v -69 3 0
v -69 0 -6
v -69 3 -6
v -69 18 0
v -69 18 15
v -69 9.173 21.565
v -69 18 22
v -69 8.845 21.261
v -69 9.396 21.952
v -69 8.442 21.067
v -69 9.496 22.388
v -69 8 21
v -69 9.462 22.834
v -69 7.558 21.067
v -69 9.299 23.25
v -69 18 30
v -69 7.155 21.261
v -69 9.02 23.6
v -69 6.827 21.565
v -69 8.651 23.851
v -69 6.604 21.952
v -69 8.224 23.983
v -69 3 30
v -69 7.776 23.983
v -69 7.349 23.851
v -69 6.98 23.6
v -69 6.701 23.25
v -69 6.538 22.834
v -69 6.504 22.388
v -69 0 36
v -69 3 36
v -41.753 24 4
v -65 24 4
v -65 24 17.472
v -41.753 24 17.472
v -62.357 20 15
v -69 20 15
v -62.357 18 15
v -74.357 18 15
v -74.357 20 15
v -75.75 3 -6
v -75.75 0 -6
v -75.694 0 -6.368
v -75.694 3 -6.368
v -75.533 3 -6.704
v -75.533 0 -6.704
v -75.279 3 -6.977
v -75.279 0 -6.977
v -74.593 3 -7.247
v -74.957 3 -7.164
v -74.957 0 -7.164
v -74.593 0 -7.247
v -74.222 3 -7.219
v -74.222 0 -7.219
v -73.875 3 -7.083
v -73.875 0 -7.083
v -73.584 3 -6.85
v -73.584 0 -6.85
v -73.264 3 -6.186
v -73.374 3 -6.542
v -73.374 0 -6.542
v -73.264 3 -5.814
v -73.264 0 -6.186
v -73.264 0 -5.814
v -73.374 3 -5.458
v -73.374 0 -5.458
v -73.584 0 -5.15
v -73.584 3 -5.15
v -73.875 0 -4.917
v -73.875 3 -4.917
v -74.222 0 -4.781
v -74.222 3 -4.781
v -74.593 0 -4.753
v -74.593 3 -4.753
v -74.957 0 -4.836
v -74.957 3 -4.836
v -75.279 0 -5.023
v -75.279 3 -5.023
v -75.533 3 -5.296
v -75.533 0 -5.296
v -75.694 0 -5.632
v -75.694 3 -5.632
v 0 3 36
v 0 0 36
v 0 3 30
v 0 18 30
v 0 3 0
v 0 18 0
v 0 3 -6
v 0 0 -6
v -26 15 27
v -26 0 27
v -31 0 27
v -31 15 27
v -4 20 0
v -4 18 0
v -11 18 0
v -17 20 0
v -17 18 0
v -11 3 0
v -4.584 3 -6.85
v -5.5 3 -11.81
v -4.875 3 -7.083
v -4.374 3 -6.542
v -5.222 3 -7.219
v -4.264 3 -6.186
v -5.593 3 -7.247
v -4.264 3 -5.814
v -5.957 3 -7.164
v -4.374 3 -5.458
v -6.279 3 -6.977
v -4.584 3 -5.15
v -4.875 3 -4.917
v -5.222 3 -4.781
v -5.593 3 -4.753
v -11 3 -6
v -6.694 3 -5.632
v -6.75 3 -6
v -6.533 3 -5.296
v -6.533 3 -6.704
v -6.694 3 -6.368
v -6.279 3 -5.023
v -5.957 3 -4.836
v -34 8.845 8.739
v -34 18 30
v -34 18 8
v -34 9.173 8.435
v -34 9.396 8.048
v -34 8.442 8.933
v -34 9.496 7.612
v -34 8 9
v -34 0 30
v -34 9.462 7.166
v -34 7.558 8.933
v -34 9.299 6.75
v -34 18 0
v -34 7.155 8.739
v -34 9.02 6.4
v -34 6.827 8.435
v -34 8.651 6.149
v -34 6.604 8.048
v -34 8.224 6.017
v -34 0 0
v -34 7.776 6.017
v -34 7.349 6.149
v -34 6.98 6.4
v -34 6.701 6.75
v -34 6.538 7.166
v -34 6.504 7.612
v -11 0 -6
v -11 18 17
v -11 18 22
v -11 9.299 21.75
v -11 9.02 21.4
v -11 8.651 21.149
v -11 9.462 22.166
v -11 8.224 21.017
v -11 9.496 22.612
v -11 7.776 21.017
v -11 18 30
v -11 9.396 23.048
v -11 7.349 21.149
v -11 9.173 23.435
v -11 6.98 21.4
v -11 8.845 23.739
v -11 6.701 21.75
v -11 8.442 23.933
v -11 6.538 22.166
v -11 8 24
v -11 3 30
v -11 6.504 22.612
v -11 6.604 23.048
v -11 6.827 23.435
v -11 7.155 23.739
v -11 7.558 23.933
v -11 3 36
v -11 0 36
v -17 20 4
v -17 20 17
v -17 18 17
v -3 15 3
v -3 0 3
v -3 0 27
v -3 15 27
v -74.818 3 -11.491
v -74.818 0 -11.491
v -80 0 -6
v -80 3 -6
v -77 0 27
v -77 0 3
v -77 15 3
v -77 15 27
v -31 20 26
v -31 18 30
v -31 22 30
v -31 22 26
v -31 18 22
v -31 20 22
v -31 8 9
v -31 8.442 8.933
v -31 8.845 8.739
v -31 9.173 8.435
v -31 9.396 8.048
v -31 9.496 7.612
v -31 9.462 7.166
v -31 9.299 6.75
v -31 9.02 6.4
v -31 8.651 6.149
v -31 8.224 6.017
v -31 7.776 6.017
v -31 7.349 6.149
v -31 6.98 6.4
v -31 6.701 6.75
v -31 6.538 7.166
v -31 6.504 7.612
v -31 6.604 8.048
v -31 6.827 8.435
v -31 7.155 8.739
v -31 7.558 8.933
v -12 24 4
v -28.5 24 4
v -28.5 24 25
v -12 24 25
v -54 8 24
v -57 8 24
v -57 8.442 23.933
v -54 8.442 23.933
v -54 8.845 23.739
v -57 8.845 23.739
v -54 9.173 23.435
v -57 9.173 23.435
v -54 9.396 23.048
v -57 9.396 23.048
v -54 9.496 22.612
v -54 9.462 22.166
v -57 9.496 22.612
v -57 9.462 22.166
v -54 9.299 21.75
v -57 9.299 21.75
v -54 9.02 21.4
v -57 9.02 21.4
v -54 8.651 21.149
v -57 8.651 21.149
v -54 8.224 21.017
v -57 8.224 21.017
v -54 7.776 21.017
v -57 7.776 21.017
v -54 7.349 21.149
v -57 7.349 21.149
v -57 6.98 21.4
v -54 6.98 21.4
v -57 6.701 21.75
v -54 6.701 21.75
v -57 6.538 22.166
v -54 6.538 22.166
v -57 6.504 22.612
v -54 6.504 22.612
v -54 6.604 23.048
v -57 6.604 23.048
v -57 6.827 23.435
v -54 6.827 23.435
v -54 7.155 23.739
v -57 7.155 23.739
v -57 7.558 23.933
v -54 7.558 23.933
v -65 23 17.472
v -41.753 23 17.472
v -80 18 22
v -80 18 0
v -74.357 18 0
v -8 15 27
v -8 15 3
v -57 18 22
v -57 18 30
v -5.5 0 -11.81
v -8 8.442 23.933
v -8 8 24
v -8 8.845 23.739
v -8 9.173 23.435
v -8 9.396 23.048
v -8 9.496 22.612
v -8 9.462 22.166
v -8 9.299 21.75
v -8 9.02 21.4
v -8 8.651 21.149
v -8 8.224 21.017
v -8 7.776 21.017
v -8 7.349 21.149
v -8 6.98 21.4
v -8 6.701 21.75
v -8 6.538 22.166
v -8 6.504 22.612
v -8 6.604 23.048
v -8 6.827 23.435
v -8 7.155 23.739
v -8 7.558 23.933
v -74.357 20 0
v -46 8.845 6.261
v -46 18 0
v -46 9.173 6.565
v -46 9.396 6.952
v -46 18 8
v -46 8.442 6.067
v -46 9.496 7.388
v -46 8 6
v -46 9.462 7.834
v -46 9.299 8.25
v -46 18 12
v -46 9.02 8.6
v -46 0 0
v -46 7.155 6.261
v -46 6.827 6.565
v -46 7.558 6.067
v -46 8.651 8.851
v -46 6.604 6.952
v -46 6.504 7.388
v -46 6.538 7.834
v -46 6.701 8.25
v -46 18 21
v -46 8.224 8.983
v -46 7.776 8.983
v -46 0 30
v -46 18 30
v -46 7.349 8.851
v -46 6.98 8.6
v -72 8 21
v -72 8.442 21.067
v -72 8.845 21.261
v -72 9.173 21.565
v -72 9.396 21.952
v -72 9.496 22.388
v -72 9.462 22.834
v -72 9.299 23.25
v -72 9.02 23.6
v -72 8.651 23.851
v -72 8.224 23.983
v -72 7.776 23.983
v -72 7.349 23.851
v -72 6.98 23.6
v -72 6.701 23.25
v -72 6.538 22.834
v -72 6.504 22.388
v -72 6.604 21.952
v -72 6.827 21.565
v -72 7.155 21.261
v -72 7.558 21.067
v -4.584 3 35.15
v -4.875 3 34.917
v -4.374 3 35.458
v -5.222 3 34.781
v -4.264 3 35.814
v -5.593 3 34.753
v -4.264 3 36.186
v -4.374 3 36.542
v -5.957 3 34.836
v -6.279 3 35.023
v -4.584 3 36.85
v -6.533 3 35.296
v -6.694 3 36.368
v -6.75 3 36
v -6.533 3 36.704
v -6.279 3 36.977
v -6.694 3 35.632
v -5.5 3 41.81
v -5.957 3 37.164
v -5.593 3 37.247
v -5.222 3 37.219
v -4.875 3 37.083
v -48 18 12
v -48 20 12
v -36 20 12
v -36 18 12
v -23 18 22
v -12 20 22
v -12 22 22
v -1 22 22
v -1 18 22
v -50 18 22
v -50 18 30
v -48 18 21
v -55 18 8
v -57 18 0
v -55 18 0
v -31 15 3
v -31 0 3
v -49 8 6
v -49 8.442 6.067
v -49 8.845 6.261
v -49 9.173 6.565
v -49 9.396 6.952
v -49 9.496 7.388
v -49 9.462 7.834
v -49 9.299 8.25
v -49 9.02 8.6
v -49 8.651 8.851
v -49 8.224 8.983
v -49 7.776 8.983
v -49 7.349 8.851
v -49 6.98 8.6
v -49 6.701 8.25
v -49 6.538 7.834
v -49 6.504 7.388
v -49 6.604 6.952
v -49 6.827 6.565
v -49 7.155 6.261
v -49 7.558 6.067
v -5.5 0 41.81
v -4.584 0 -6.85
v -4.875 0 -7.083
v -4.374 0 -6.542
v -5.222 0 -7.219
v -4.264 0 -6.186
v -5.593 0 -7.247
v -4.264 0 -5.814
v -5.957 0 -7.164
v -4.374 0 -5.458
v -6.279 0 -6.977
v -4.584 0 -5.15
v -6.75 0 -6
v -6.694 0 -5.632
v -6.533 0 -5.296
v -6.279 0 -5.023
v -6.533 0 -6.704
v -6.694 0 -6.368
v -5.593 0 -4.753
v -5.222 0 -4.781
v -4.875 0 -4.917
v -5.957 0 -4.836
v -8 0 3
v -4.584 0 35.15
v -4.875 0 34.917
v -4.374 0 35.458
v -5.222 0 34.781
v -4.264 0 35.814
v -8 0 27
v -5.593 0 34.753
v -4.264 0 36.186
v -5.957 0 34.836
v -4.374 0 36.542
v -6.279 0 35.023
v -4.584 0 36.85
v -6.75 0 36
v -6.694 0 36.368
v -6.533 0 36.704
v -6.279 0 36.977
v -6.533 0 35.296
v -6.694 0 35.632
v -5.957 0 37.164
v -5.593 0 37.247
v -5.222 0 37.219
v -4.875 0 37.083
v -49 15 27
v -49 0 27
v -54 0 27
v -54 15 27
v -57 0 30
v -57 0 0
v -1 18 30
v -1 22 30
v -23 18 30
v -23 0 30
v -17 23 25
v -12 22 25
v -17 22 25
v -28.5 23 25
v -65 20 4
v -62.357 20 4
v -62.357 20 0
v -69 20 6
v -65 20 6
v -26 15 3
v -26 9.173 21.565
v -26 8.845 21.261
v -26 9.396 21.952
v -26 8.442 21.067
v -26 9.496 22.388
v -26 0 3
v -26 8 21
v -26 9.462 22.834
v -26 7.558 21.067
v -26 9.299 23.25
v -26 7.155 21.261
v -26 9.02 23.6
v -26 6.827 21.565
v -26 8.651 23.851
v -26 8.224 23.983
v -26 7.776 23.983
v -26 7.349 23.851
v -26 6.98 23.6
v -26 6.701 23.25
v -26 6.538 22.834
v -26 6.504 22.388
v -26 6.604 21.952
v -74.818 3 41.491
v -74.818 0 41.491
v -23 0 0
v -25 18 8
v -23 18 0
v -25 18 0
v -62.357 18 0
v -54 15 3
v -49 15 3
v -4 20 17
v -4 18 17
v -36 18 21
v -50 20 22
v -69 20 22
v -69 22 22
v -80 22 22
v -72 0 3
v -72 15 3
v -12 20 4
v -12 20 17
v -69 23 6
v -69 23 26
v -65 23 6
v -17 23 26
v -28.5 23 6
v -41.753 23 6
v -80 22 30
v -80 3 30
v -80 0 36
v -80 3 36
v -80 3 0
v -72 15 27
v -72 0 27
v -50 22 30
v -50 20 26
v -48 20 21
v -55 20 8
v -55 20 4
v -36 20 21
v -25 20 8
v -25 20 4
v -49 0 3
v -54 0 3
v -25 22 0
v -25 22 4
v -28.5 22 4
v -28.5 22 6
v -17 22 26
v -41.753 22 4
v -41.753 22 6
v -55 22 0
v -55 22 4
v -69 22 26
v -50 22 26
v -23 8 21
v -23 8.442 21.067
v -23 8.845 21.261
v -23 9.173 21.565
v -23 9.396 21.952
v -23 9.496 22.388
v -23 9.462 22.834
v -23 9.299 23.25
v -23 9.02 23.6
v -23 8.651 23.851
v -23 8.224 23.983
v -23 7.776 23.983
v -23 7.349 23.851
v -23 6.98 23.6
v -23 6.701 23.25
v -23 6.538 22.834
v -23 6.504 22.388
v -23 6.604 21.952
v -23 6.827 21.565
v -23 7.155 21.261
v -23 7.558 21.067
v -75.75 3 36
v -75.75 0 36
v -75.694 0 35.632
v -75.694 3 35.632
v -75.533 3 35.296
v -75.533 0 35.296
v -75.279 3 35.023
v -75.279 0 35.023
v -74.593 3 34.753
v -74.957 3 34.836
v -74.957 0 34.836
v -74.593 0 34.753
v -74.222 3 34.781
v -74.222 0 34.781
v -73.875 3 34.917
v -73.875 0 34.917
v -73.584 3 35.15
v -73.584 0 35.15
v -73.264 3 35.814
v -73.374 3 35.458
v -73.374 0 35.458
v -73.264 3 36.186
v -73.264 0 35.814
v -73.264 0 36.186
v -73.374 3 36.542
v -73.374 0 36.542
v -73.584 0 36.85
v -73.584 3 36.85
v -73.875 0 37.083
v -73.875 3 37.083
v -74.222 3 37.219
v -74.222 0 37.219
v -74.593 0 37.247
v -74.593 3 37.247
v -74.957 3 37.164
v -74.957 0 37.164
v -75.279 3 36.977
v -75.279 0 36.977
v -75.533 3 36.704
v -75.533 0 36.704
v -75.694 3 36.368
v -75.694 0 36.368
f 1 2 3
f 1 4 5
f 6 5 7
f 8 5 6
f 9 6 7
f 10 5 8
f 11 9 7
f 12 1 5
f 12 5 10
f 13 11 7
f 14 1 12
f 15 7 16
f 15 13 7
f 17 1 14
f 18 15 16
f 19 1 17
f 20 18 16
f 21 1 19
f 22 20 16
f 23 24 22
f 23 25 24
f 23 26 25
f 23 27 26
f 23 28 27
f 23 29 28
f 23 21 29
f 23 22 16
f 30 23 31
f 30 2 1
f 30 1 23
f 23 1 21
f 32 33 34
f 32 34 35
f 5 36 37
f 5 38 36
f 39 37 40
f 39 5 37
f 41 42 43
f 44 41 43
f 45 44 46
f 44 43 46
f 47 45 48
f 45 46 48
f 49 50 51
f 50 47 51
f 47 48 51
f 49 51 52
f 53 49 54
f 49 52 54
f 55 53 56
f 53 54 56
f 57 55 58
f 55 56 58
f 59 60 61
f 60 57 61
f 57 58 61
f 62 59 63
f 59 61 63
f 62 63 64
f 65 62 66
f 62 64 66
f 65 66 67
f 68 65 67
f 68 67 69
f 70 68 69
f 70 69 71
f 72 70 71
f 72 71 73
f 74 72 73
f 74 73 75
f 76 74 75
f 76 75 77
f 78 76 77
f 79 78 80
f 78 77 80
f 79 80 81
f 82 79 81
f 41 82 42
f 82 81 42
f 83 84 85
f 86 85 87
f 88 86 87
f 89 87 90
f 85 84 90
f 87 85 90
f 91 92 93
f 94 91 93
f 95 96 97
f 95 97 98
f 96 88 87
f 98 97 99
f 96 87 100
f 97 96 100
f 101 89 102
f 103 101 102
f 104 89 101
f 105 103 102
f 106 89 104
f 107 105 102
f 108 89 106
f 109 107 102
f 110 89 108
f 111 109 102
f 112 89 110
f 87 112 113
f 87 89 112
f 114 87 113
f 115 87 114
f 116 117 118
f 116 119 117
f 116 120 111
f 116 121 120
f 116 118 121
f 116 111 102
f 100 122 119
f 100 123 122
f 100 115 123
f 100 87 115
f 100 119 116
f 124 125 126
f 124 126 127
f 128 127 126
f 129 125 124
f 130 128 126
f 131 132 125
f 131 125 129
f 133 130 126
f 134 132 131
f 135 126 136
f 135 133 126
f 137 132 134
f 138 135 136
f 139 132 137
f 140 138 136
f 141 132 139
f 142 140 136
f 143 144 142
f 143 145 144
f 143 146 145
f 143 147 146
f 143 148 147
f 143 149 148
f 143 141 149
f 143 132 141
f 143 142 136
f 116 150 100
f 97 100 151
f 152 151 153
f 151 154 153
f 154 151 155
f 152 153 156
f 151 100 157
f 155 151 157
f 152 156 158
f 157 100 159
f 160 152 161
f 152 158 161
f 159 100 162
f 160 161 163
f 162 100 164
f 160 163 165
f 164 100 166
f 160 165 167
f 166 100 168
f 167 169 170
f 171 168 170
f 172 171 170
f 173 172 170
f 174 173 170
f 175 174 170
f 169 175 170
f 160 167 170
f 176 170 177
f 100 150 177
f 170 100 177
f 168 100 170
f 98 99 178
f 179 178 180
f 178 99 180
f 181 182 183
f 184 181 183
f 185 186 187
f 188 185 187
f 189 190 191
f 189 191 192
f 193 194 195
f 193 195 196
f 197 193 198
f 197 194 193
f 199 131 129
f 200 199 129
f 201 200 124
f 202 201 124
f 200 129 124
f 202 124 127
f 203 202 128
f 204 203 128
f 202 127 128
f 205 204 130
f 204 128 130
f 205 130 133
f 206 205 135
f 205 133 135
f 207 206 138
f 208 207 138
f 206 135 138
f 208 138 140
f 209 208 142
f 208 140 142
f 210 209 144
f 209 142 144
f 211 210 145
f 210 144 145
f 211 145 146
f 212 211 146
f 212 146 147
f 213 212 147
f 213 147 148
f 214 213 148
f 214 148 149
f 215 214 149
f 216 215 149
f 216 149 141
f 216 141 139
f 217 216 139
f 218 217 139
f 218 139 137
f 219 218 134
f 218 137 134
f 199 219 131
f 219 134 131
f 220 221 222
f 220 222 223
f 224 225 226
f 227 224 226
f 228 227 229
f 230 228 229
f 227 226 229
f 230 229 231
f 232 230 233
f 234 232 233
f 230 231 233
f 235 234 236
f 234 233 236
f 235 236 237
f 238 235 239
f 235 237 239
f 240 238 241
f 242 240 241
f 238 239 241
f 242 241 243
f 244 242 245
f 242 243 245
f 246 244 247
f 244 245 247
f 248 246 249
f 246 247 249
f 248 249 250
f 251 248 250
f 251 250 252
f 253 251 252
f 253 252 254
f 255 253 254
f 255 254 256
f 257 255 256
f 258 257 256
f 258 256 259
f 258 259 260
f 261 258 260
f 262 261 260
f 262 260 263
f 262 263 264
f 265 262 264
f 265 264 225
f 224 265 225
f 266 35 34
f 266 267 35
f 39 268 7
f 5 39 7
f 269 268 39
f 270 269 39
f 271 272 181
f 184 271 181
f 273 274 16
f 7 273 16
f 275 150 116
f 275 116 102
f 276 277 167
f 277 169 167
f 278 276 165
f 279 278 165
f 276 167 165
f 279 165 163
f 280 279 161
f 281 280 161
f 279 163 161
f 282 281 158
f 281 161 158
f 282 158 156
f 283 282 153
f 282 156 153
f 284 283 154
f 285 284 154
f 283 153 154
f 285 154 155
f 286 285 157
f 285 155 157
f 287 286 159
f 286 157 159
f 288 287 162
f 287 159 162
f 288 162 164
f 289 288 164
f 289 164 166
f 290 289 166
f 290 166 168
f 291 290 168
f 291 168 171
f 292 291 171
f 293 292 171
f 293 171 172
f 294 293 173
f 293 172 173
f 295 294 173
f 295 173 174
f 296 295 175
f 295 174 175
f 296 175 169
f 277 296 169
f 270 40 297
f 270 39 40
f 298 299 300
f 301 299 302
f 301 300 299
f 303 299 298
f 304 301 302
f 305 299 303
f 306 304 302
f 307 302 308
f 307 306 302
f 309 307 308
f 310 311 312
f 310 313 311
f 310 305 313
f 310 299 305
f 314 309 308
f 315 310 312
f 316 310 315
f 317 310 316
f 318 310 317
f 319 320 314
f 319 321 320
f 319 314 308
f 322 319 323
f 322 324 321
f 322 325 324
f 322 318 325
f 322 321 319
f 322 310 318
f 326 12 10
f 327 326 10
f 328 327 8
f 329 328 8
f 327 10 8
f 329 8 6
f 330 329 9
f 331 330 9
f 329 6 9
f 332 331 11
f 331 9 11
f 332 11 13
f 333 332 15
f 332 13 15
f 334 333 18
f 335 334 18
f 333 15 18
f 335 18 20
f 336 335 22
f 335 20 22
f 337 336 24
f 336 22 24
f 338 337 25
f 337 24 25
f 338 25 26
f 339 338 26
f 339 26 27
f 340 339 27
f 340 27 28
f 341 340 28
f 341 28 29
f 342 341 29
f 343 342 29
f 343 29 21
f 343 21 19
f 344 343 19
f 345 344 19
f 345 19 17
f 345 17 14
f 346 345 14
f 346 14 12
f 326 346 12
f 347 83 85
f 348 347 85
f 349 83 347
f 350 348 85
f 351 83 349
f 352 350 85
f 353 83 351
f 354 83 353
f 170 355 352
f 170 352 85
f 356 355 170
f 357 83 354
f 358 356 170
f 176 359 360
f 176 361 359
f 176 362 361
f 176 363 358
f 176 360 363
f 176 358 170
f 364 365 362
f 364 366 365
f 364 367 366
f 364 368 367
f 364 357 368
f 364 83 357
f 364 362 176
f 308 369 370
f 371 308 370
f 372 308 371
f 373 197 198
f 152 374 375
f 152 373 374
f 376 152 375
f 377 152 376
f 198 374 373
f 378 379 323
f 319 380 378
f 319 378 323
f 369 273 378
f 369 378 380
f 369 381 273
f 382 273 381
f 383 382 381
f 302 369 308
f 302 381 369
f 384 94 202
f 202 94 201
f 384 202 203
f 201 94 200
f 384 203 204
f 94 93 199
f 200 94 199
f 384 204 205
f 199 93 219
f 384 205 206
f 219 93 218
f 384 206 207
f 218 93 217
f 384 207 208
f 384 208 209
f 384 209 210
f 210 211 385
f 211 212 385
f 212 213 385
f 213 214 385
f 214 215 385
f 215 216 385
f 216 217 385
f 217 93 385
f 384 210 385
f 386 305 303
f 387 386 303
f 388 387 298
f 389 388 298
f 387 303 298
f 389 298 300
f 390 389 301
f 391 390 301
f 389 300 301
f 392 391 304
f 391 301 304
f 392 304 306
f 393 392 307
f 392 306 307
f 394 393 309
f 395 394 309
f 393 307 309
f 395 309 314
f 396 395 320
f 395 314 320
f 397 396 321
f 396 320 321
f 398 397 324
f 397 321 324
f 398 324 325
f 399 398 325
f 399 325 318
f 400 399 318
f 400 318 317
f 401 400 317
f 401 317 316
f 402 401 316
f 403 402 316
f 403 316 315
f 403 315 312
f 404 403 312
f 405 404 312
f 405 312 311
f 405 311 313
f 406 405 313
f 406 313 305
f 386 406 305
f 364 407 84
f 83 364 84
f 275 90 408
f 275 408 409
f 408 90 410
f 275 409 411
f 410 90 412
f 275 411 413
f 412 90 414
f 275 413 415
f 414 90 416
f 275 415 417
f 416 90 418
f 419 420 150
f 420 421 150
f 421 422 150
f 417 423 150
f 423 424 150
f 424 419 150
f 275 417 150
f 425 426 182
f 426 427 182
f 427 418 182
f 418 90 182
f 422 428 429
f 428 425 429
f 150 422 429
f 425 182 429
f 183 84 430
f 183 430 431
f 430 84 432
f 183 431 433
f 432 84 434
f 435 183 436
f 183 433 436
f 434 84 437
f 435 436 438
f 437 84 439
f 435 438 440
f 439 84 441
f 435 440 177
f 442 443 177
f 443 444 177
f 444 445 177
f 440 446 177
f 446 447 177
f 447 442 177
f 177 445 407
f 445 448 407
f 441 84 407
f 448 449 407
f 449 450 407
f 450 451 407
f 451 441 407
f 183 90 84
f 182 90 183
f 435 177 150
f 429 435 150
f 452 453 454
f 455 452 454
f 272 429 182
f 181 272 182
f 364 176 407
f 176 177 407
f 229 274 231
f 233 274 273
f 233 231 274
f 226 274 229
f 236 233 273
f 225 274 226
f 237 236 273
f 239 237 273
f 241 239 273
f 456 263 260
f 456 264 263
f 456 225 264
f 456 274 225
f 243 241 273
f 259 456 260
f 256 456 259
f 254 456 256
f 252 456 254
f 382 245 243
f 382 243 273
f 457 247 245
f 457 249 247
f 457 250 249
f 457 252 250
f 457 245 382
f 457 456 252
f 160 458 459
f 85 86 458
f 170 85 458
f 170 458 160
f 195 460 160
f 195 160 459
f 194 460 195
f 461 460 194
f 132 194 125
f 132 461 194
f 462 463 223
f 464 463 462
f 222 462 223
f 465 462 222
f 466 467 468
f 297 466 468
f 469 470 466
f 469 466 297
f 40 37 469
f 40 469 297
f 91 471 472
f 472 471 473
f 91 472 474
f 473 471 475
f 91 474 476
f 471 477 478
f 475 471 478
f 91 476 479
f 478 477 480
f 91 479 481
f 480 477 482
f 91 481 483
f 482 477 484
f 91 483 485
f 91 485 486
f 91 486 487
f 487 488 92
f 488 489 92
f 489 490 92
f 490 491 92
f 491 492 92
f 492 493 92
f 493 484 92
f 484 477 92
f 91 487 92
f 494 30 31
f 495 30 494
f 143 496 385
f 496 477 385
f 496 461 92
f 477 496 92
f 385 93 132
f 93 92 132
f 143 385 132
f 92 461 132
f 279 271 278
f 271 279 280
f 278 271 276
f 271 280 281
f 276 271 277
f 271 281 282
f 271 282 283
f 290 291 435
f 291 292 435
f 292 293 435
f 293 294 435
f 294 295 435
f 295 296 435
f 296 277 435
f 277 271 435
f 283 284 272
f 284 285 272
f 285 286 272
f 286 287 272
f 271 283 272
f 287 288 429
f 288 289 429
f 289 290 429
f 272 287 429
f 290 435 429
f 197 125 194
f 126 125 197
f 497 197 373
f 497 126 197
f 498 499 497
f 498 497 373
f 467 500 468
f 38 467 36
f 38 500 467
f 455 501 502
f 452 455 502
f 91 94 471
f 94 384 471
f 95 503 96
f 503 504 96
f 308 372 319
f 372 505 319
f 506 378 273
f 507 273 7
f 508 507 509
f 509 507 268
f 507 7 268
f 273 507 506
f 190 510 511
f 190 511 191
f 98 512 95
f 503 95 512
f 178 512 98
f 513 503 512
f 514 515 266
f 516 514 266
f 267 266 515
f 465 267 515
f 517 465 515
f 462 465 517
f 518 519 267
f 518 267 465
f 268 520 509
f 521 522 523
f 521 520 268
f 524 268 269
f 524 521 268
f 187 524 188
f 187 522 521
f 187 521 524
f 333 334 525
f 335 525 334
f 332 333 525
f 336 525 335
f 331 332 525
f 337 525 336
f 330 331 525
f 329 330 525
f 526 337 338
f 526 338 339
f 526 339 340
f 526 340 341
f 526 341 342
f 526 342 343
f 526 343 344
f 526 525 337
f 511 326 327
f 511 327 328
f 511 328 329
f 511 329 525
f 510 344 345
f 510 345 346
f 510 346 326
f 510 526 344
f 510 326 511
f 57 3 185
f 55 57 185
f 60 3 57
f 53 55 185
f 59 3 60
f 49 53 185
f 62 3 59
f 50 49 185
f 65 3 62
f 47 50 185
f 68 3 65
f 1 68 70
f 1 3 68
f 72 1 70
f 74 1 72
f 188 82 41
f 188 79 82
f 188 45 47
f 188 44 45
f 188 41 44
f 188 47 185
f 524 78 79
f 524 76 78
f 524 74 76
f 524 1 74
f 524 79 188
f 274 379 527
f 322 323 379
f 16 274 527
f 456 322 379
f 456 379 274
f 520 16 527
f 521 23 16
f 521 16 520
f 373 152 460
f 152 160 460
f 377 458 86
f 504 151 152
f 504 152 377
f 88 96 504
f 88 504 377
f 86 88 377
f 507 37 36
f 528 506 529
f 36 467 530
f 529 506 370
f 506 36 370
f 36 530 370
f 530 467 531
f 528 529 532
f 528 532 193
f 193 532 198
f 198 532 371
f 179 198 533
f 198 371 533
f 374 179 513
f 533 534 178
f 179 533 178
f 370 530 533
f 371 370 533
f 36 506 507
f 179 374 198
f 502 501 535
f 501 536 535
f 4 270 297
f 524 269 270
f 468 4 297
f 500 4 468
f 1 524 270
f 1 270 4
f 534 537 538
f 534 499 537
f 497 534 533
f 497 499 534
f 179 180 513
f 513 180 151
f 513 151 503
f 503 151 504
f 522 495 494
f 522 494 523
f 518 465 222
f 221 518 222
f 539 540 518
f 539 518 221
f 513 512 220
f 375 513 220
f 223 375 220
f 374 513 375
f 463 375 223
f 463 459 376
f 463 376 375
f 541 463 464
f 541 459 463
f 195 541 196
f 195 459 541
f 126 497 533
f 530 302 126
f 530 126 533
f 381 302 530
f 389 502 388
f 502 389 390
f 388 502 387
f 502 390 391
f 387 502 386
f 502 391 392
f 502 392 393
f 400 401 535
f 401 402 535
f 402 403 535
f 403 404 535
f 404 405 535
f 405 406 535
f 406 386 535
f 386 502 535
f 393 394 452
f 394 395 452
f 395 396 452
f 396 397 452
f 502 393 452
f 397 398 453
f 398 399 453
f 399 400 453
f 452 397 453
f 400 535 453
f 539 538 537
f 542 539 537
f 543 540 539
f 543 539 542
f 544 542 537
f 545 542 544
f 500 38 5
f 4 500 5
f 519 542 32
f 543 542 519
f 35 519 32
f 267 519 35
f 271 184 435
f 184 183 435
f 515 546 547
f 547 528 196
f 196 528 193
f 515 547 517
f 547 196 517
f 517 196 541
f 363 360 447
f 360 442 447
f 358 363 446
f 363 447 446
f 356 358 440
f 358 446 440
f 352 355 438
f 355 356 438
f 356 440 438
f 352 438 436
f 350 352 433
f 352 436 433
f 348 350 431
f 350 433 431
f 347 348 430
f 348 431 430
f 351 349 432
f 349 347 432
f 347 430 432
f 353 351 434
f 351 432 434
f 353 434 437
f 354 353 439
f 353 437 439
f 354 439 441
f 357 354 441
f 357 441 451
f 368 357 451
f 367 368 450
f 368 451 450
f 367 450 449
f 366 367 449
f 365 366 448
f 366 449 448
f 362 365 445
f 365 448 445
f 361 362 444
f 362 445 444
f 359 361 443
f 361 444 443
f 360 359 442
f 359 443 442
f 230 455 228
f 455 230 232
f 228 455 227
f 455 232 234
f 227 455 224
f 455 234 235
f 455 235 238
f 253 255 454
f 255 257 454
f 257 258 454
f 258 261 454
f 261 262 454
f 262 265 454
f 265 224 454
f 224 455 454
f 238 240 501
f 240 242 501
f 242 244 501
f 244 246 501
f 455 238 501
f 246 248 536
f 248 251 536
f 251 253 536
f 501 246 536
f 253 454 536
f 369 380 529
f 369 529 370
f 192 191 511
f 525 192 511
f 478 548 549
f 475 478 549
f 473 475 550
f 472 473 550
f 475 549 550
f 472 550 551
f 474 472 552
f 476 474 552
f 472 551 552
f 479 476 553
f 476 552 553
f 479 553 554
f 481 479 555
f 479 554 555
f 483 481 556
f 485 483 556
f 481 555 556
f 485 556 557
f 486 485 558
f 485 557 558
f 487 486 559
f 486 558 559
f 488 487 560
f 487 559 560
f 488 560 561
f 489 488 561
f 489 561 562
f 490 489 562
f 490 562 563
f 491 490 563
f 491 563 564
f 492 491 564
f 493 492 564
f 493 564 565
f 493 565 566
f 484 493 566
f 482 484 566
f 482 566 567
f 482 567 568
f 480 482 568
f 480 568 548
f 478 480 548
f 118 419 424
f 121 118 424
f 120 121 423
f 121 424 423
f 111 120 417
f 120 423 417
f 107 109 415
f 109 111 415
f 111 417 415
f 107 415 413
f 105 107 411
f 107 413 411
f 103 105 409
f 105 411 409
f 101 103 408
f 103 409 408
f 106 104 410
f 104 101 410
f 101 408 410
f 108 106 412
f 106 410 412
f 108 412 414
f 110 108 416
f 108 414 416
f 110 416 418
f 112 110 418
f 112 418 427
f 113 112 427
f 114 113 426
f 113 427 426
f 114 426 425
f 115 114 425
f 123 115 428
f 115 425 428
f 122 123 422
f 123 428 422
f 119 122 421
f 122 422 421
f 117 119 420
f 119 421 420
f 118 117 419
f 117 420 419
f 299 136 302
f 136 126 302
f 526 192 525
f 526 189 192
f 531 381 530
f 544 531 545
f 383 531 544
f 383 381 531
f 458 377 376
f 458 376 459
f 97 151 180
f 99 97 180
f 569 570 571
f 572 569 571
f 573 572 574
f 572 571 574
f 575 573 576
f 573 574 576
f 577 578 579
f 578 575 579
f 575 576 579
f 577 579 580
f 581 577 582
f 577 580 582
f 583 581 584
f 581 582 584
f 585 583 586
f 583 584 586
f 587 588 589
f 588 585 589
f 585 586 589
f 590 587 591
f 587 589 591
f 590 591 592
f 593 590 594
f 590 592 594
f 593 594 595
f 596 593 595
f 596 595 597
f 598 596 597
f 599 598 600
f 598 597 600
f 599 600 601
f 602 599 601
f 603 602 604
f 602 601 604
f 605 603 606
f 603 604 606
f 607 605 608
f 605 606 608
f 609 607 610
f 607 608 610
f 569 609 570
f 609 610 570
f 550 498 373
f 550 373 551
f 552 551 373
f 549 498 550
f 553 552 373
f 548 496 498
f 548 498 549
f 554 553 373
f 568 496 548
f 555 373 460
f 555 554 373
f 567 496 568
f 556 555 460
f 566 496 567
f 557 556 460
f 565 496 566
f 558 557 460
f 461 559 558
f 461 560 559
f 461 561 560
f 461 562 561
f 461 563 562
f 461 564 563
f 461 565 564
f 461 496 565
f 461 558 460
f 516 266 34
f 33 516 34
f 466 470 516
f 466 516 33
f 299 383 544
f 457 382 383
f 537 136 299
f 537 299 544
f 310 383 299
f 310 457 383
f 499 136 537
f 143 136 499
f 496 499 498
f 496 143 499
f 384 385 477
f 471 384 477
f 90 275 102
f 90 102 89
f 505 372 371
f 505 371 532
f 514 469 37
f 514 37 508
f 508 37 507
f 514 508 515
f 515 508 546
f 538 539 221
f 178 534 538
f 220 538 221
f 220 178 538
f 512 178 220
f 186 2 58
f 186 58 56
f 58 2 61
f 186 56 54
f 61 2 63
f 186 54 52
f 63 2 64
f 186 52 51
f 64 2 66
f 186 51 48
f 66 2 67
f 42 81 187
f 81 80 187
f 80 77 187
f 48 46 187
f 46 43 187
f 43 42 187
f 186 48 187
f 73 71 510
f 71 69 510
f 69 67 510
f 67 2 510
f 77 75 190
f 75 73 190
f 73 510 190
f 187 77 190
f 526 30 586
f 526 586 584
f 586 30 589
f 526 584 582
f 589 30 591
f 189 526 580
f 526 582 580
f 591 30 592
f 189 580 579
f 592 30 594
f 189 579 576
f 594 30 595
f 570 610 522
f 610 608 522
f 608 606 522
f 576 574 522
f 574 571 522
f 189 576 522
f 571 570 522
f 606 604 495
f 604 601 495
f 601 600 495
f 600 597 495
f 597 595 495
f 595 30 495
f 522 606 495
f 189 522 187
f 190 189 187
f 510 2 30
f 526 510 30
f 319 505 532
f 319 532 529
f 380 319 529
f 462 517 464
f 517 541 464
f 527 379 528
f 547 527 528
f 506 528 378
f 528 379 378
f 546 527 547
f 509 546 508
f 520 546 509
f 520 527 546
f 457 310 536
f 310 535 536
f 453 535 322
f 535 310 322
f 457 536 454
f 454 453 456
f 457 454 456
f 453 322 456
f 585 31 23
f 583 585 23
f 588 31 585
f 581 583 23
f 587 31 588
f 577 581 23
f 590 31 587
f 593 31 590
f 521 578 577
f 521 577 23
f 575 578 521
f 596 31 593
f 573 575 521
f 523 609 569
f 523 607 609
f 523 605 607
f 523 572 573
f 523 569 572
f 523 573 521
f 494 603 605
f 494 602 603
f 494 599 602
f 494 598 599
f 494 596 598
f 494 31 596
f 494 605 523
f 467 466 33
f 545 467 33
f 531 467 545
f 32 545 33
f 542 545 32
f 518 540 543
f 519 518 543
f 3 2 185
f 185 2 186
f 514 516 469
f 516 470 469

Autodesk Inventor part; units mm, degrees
ref_plane "YZ Plane" through (0, 0, 0) normal (1, 0, 0) x (0, 1, 0)
ref_plane "XY Plane" through (0, 0, 0) normal (0, 0, 1) x (1, 0, 0)
sketch "Sketch1" plane through (0, 0, 0) normal (0, 1, 0) x (-1, 0, 0)
  line L0 (0, 0) -> (80, 0) construction
  line L1 (80, 0) -> (80, 30) construction
  line L2 (80, 30) -> (0, 30) construction
  line L3 (0, 30) -> (0, 0) construction
  dimension "d0" = 80
  dimension "d1" = 30
sketch "Sketch2" plane through (0, 0, 0) normal (0, 1, 0) x (-1, 0, 0)
  line L0 (80, 0) -> (69, 0)
  line L1 (69, 0) -> (69, 30)
  line L2 (69, 30) -> (80, 30)
  line L3 (80, 30) -> (80, 0)
  line L4 (0, 0) -> (11, 0)
  line L5 (11, 0) -> (11, 30)
  line L6 (11, 30) -> (0, 30)
  line L7 (0, 30) -> (0, 0)
  line L8 (57, 0) -> (46, 0)
  line L9 (46, 0) -> (46, 30)
  line L10 (46, 30) -> (57, 30)
  line L11 (57, 30) -> (57, 0)
  line L12 (34, 0) -> (23, 0)
  line L13 (23, 0) -> (23, 30)
  line L14 (23, 30) -> (34, 30)
  line L15 (34, 30) -> (34, 0)
  line L16 (69, 15) -> (57, 15) construction
  line L17 (46, 15) -> (34, 15) construction
  line L18 (23, 15) -> (11, 15) construction
  line L19 (72, 3) -> (77, 3)
  line L20 (77, 3) -> (77, 27)
  line L21 (77, 27) -> (72, 27)
  line L22 (72, 27) -> (72, 3)
  line L23 (54, 3) -> (49, 3)
  line L24 (49, 3) -> (49, 27)
  line L25 (49, 27) -> (54, 27)
  line L26 (54, 27) -> (54, 3)
  line L27 (31, 3) -> (26, 3)
  line L28 (26, 3) -> (26, 27)
  line L29 (26, 27) -> (31, 27)
  line L30 (31, 27) -> (31, 3)
  line L31 (8, 27) -> (8, 3)
  line L32 (8, 3) -> (3, 3)
  line L33 (3, 3) -> (3, 27)
  line L34 (3, 27) -> (8, 27)
  dimension "d2" = 11
  dimension "d3" = 30
  dimension "d4" = 11
  dimension "d6" = 11
  dimension "d8" = 11
  dimension "d9" = 80
  dimension "d10" = 3
  dimension "d11" = 3
  dimension "d12" = 3
  dimension "d13" = 3
extrude "Extrusion1" add sketch "Sketch2" along normal blind 15
sketch "Sketch3" plane through (0, 15, 0) normal (0, 1, 0) x (1, 0, 0)
  line L0 (-69, 0) -> (-80, 0) projected
  line L1 (-80, 0) -> (-69, 0)
  line L2 (-69, 0) -> (-69, -30)
  line L3 (-69, -30) -> (-80, -30)
  line L4 (-80, -30) -> (-80, 0)
  line L5 (-57, 0) -> (-46, 0)
  line L6 (-46, 0) -> (-46, -30)
  line L7 (-46, -30) -> (-57, -30)
  line L8 (-57, -30) -> (-57, 0)
  line L9 (-34, 0) -> (-23, 0)
  line L10 (-23, 0) -> (-23, -30)
  line L11 (-23, -30) -> (-34, -30)
  line L12 (-34, -30) -> (-34, 0)
  line L13 (-11, 0) -> (0, 0)
  line L14 (0, 0) -> (0, -30)
  line L15 (0, -30) -> (-11, -30)
  line L16 (-11, -30) -> (-11, 0)
  dimension "d16" = 30
  dimension "d19" = 23
extrude "Extrusion2" add sketch "Sketch3" along normal blind 3
sketch "Sketch4" plane through (-69, 0, 30) normal (1, 0, 0) x (0, 0, -1)
  circle A0 centre (7.5, 8) radius 1.5
  line L0 (3, 0) -> (27, 0) projected
  line L1 (0, 0) -> (0, 18) construction
  dimension "d26" = 3
  dimension "d28" = 8
  dimension "d29" = 7.5
extrude "Extrusion3" cut sketch "Sketch4" against normal blind 3
sketch "Sketch5" plane through (-57, 0, 0) normal (-1, 0, 0) x (0, 0, 1)
  circle A0 centre (22.5, 8) radius 1.5
  line L0 (30, 0) -> (30, 18) projected
  line L1 (3, 0) -> (27, 0) projected
  point P0 (0, 0)
  dimension "d33" = 3
  dimension "d34" = 7.5
  dimension "d35" = 8
extrude "Extrusion4" cut sketch "Sketch5" against normal blind 3
sketch "Sketch6" plane through (-46, 0, 30) normal (1, 0, 0) x (0, 0, -1)
  circle A0 centre (22.5, 8) radius 1.5
  line L0 (30, 0) -> (30, 18) projected
  line L1 (3, 0) -> (27, 0) projected
  dimension "d38" = 3
  dimension "d39" = 7.5
  dimension "d40" = 8
sketch "Sketch7" plane through (-34, 0, 0) normal (-1, 0, 0) x (0, 0, 1)
  circle A0 centre (7.5, 8) radius 1.5
  line L0 (3, 0) -> (27, 0) projected
  line L1 (0, 0) -> (0, 18) projected
  dimension "d41" = 3
  dimension "d42" = 8
  dimension "d43" = 7.5
sketch "Sketch8" plane through (-23, 0, 30) normal (1, 0, 0) x (0, 0, -1)
  circle A0 centre (7.5, 8) radius 1.5
  line L0 (3, 0) -> (27, 0) projected
  line L1 (0, 0) -> (0, 18) projected
  point P0 (30, 0)
  dimension "d44" = 3
  dimension "d45" = 8
  dimension "d46" = 7.5
sketch "Sketch9" plane through (-11, 0, 0) normal (-1, 0, 0) x (0, 0, 1)
  point P0 (0, 0)
sketch "Sketch10" plane through (-11, 0, 0) normal (-1, 0, 0) x (0, 0, 1)
  circle A0 centre (22.5, 8) radius 1.5
  line L0 (30, 0) -> (30, 18) projected
  line L1 (3, 0) -> (27, 0) projected
  point P0 (0, 0)
  dimension "d47" = 3
  dimension "d48" = 7.5
  dimension "d49" = 8
extrude "Extrusion5" cut sketch "Sketch6" against normal blind 3
extrude "Extrusion6" cut sketch "Sketch7" against normal blind 3
extrude "Extrusion7" cut sketch "Sketch8" against normal blind 3
extrude "Extrusion8" cut sketch "Sketch10" against normal blind 3
ref_plane "Work Plane1" through (0, 18, 0) normal (0, 1, 0) x (-1, 0, 0)
sketch "Sketch12" plane through (0, 18, 0) normal (0, 1, 0) x (-1, 0, 0)
  line L0 (80, 30) -> (50, 30)
  line L1 (50, 30) -> (50, 22)
  line L2 (50, 22) -> (80, 22)
  line L3 (80, 22) -> (80, 30)
  line L4 (55, 0) -> (25, 0)
  line L5 (25, 0) -> (25, 8)
  line L6 (25, 8) -> (55, 8)
  line L7 (55, 8) -> (55, 0)
  line L8 (31, 3) -> (31, 27) projected
  line L9 (31, 22) -> (1, 22)
  line L10 (1, 22) -> (1, 30)
  line L11 (1, 30) -> (31, 30)
  line L12 (31, 30) -> (31, 22)
  point P0 (0, 0)
  dimension "d59" = 30
  dimension "d60" = 8
  dimension "d61" = 30
  dimension "d62" = 8
  dimension "d63" = 30
sketch "Sketch13" plane through (0, 18, 0) normal (0, 1, 0) x (-1, 0, 0)
  line L0 (74.3573, 0) -> (62.3573, 0)
  line L1 (62.3573, 0) -> (62.3573, 15)
  line L2 (62.3573, 15) -> (74.3573, 15)
  line L3 (74.3573, 15) -> (74.3573, 0)
  line L4 (48, 12) -> (36, 12)
  line L5 (36, 12) -> (36, 21)
  line L6 (36, 21) -> (48, 21)
  line L7 (48, 21) -> (48, 12)
  line L8 (0, 0) -> (11, 0) projected
  line L9 (4, 0) -> (17, 0)
  line L10 (17, 0) -> (17, 17)
  line L11 (17, 17) -> (4, 17)
  line L12 (4, 17) -> (4, 0)
  dimension "d64" = 12
  dimension "d65" = 15
  dimension "d66" = 12
  dimension "d67" = 13
  dimension "d68" = 17
extrude "Extrusion9" add sketch "Sketch13" along normal blind 2
extrude "Extrusion10" add sketch "Sketch12" along normal blind 4
sketch "Sketch14" plane through (0, 20, 0) normal (0, 1, 0) x (1, 0, 0)
  line L0 (-65, -4) -> (-41.7529, -4)
  line L1 (-41.7529, -4) -> (-41.7529, -17.4715)
  line L2 (-41.7529, -17.4715) -> (-65, -17.4715)
  line L3 (-65, -17.4715) -> (-65, -4)
  line L4 (-12, -25) -> (-28.5, -25)
  line L5 (-28.5, -25) -> (-28.5, -4)
  line L6 (-28.5, -4) -> (-12, -4)
  line L7 (-12, -4) -> (-12, -25)
  point P0 (0, 0)
  dimension "d73" = 16.5
extrude "Extrusion11" add sketch "Sketch14" along normal blind 4
sketch "Sketch15" plane through (0, 20, 0) normal (0, 1, 0) x (1, 0, 0)
  line L0 (-69, -30) -> (-69, -22) projected
  line L1 (-69, -26) -> (-17, -26)
  line L2 (-17, -26) -> (-17, -6)
  line L3 (-17, -6) -> (-69, -6)
  line L4 (-69, -6) -> (-69, -26)
  point P0 (0, 0)
  dimension "d76" = 52
  dimension "d77" = 20
extrude "Extrusion12" add sketch "Sketch15" along normal blind 3
sketch "Sketch16" plane through (0, 0, 0) normal (0, 1, 0) x (-1, 0, 0)
  line L0 (69, 30) -> (80, 30) projected
  line L1 (80, 30) -> (80, 36)
  line L2 (69, 30) -> (69, 36)
  line L3 (69, 36) -> (74.8182, 41.4908)
  line L4 (74.8182, 41.4908) -> (80, 36)
  circle A0 centre (74.5, 36) radius 1.25
  line L5 (74.5, 36) -> (80, 36) construction
  line L6 (74.5, 36) -> (69, 36) construction
  line L7 (11, 30) -> (11, 36)
  line L8 (0, 30) -> (0, 36)
  line L9 (11, 36) -> (5.5, 41.8095)
  line L10 (5.5, 41.8095) -> (0, 36)
  circle A1 centre (5.5, 36) radius 1.25
  line L11 (5.5, 36) -> (11, 36) construction
  line L12 (5.5, 36) -> (0, 36) construction
  line L13 (80, 15) -> (0, 15) construction
  line L14 (69, 0) -> (80, 0)
  line L15 (80, 0) -> (80, -6)
  line L16 (69, 0) -> (69, -6)
  line L17 (69, -6) -> (74.8182, -11.4908)
  line L18 (74.8182, -11.4908) -> (80, -6)
  circle A2 centre (74.5, -6) radius 1.25
  line L19 (74.5, -6) -> (80, -6) construction
  line L20 (74.5, -6) -> (69, -6) construction
  line L21 (11, 0) -> (11, -6)
  line L22 (0, 0) -> (0, -6)
  line L23 (11, -6) -> (5.5, -11.8095)
  line L24 (5.5, -11.8095) -> (0, -6)
  circle A3 centre (5.5, -6) radius 1.25
  line L25 (5.5, -6) -> (11, -6) construction
  line L26 (5.5, -6) -> (0, -6) construction
  line L27 (80, 0) -> (69, 0) projected
  line L28 (80, 0) -> (69, 0)
  line L29 (11, 0) -> (0, 0)
  line L30 (4, 0) -> (17, 0) projected
  line L31 (11, 30) -> (0, 30)
  dimension "d80" = 6
  dimension "d81" = 6
  dimension "d82" = 8
  dimension "d83" = 2.5
  dimension "d84" = 6
  dimension "d85" = 6
  dimension "d86" = 6
  dimension "d87" = 8
  dimension "d88" = 2.5
extrude "Extrusion14" add sketch "Sketch16" along normal blind 3
equation "\"d84\" = d81"
equation "\"d85\" = d86"
equation "\"d86\" = d84"
equation "\"d87\" = d82"
properties part number "ball-waterfall"
